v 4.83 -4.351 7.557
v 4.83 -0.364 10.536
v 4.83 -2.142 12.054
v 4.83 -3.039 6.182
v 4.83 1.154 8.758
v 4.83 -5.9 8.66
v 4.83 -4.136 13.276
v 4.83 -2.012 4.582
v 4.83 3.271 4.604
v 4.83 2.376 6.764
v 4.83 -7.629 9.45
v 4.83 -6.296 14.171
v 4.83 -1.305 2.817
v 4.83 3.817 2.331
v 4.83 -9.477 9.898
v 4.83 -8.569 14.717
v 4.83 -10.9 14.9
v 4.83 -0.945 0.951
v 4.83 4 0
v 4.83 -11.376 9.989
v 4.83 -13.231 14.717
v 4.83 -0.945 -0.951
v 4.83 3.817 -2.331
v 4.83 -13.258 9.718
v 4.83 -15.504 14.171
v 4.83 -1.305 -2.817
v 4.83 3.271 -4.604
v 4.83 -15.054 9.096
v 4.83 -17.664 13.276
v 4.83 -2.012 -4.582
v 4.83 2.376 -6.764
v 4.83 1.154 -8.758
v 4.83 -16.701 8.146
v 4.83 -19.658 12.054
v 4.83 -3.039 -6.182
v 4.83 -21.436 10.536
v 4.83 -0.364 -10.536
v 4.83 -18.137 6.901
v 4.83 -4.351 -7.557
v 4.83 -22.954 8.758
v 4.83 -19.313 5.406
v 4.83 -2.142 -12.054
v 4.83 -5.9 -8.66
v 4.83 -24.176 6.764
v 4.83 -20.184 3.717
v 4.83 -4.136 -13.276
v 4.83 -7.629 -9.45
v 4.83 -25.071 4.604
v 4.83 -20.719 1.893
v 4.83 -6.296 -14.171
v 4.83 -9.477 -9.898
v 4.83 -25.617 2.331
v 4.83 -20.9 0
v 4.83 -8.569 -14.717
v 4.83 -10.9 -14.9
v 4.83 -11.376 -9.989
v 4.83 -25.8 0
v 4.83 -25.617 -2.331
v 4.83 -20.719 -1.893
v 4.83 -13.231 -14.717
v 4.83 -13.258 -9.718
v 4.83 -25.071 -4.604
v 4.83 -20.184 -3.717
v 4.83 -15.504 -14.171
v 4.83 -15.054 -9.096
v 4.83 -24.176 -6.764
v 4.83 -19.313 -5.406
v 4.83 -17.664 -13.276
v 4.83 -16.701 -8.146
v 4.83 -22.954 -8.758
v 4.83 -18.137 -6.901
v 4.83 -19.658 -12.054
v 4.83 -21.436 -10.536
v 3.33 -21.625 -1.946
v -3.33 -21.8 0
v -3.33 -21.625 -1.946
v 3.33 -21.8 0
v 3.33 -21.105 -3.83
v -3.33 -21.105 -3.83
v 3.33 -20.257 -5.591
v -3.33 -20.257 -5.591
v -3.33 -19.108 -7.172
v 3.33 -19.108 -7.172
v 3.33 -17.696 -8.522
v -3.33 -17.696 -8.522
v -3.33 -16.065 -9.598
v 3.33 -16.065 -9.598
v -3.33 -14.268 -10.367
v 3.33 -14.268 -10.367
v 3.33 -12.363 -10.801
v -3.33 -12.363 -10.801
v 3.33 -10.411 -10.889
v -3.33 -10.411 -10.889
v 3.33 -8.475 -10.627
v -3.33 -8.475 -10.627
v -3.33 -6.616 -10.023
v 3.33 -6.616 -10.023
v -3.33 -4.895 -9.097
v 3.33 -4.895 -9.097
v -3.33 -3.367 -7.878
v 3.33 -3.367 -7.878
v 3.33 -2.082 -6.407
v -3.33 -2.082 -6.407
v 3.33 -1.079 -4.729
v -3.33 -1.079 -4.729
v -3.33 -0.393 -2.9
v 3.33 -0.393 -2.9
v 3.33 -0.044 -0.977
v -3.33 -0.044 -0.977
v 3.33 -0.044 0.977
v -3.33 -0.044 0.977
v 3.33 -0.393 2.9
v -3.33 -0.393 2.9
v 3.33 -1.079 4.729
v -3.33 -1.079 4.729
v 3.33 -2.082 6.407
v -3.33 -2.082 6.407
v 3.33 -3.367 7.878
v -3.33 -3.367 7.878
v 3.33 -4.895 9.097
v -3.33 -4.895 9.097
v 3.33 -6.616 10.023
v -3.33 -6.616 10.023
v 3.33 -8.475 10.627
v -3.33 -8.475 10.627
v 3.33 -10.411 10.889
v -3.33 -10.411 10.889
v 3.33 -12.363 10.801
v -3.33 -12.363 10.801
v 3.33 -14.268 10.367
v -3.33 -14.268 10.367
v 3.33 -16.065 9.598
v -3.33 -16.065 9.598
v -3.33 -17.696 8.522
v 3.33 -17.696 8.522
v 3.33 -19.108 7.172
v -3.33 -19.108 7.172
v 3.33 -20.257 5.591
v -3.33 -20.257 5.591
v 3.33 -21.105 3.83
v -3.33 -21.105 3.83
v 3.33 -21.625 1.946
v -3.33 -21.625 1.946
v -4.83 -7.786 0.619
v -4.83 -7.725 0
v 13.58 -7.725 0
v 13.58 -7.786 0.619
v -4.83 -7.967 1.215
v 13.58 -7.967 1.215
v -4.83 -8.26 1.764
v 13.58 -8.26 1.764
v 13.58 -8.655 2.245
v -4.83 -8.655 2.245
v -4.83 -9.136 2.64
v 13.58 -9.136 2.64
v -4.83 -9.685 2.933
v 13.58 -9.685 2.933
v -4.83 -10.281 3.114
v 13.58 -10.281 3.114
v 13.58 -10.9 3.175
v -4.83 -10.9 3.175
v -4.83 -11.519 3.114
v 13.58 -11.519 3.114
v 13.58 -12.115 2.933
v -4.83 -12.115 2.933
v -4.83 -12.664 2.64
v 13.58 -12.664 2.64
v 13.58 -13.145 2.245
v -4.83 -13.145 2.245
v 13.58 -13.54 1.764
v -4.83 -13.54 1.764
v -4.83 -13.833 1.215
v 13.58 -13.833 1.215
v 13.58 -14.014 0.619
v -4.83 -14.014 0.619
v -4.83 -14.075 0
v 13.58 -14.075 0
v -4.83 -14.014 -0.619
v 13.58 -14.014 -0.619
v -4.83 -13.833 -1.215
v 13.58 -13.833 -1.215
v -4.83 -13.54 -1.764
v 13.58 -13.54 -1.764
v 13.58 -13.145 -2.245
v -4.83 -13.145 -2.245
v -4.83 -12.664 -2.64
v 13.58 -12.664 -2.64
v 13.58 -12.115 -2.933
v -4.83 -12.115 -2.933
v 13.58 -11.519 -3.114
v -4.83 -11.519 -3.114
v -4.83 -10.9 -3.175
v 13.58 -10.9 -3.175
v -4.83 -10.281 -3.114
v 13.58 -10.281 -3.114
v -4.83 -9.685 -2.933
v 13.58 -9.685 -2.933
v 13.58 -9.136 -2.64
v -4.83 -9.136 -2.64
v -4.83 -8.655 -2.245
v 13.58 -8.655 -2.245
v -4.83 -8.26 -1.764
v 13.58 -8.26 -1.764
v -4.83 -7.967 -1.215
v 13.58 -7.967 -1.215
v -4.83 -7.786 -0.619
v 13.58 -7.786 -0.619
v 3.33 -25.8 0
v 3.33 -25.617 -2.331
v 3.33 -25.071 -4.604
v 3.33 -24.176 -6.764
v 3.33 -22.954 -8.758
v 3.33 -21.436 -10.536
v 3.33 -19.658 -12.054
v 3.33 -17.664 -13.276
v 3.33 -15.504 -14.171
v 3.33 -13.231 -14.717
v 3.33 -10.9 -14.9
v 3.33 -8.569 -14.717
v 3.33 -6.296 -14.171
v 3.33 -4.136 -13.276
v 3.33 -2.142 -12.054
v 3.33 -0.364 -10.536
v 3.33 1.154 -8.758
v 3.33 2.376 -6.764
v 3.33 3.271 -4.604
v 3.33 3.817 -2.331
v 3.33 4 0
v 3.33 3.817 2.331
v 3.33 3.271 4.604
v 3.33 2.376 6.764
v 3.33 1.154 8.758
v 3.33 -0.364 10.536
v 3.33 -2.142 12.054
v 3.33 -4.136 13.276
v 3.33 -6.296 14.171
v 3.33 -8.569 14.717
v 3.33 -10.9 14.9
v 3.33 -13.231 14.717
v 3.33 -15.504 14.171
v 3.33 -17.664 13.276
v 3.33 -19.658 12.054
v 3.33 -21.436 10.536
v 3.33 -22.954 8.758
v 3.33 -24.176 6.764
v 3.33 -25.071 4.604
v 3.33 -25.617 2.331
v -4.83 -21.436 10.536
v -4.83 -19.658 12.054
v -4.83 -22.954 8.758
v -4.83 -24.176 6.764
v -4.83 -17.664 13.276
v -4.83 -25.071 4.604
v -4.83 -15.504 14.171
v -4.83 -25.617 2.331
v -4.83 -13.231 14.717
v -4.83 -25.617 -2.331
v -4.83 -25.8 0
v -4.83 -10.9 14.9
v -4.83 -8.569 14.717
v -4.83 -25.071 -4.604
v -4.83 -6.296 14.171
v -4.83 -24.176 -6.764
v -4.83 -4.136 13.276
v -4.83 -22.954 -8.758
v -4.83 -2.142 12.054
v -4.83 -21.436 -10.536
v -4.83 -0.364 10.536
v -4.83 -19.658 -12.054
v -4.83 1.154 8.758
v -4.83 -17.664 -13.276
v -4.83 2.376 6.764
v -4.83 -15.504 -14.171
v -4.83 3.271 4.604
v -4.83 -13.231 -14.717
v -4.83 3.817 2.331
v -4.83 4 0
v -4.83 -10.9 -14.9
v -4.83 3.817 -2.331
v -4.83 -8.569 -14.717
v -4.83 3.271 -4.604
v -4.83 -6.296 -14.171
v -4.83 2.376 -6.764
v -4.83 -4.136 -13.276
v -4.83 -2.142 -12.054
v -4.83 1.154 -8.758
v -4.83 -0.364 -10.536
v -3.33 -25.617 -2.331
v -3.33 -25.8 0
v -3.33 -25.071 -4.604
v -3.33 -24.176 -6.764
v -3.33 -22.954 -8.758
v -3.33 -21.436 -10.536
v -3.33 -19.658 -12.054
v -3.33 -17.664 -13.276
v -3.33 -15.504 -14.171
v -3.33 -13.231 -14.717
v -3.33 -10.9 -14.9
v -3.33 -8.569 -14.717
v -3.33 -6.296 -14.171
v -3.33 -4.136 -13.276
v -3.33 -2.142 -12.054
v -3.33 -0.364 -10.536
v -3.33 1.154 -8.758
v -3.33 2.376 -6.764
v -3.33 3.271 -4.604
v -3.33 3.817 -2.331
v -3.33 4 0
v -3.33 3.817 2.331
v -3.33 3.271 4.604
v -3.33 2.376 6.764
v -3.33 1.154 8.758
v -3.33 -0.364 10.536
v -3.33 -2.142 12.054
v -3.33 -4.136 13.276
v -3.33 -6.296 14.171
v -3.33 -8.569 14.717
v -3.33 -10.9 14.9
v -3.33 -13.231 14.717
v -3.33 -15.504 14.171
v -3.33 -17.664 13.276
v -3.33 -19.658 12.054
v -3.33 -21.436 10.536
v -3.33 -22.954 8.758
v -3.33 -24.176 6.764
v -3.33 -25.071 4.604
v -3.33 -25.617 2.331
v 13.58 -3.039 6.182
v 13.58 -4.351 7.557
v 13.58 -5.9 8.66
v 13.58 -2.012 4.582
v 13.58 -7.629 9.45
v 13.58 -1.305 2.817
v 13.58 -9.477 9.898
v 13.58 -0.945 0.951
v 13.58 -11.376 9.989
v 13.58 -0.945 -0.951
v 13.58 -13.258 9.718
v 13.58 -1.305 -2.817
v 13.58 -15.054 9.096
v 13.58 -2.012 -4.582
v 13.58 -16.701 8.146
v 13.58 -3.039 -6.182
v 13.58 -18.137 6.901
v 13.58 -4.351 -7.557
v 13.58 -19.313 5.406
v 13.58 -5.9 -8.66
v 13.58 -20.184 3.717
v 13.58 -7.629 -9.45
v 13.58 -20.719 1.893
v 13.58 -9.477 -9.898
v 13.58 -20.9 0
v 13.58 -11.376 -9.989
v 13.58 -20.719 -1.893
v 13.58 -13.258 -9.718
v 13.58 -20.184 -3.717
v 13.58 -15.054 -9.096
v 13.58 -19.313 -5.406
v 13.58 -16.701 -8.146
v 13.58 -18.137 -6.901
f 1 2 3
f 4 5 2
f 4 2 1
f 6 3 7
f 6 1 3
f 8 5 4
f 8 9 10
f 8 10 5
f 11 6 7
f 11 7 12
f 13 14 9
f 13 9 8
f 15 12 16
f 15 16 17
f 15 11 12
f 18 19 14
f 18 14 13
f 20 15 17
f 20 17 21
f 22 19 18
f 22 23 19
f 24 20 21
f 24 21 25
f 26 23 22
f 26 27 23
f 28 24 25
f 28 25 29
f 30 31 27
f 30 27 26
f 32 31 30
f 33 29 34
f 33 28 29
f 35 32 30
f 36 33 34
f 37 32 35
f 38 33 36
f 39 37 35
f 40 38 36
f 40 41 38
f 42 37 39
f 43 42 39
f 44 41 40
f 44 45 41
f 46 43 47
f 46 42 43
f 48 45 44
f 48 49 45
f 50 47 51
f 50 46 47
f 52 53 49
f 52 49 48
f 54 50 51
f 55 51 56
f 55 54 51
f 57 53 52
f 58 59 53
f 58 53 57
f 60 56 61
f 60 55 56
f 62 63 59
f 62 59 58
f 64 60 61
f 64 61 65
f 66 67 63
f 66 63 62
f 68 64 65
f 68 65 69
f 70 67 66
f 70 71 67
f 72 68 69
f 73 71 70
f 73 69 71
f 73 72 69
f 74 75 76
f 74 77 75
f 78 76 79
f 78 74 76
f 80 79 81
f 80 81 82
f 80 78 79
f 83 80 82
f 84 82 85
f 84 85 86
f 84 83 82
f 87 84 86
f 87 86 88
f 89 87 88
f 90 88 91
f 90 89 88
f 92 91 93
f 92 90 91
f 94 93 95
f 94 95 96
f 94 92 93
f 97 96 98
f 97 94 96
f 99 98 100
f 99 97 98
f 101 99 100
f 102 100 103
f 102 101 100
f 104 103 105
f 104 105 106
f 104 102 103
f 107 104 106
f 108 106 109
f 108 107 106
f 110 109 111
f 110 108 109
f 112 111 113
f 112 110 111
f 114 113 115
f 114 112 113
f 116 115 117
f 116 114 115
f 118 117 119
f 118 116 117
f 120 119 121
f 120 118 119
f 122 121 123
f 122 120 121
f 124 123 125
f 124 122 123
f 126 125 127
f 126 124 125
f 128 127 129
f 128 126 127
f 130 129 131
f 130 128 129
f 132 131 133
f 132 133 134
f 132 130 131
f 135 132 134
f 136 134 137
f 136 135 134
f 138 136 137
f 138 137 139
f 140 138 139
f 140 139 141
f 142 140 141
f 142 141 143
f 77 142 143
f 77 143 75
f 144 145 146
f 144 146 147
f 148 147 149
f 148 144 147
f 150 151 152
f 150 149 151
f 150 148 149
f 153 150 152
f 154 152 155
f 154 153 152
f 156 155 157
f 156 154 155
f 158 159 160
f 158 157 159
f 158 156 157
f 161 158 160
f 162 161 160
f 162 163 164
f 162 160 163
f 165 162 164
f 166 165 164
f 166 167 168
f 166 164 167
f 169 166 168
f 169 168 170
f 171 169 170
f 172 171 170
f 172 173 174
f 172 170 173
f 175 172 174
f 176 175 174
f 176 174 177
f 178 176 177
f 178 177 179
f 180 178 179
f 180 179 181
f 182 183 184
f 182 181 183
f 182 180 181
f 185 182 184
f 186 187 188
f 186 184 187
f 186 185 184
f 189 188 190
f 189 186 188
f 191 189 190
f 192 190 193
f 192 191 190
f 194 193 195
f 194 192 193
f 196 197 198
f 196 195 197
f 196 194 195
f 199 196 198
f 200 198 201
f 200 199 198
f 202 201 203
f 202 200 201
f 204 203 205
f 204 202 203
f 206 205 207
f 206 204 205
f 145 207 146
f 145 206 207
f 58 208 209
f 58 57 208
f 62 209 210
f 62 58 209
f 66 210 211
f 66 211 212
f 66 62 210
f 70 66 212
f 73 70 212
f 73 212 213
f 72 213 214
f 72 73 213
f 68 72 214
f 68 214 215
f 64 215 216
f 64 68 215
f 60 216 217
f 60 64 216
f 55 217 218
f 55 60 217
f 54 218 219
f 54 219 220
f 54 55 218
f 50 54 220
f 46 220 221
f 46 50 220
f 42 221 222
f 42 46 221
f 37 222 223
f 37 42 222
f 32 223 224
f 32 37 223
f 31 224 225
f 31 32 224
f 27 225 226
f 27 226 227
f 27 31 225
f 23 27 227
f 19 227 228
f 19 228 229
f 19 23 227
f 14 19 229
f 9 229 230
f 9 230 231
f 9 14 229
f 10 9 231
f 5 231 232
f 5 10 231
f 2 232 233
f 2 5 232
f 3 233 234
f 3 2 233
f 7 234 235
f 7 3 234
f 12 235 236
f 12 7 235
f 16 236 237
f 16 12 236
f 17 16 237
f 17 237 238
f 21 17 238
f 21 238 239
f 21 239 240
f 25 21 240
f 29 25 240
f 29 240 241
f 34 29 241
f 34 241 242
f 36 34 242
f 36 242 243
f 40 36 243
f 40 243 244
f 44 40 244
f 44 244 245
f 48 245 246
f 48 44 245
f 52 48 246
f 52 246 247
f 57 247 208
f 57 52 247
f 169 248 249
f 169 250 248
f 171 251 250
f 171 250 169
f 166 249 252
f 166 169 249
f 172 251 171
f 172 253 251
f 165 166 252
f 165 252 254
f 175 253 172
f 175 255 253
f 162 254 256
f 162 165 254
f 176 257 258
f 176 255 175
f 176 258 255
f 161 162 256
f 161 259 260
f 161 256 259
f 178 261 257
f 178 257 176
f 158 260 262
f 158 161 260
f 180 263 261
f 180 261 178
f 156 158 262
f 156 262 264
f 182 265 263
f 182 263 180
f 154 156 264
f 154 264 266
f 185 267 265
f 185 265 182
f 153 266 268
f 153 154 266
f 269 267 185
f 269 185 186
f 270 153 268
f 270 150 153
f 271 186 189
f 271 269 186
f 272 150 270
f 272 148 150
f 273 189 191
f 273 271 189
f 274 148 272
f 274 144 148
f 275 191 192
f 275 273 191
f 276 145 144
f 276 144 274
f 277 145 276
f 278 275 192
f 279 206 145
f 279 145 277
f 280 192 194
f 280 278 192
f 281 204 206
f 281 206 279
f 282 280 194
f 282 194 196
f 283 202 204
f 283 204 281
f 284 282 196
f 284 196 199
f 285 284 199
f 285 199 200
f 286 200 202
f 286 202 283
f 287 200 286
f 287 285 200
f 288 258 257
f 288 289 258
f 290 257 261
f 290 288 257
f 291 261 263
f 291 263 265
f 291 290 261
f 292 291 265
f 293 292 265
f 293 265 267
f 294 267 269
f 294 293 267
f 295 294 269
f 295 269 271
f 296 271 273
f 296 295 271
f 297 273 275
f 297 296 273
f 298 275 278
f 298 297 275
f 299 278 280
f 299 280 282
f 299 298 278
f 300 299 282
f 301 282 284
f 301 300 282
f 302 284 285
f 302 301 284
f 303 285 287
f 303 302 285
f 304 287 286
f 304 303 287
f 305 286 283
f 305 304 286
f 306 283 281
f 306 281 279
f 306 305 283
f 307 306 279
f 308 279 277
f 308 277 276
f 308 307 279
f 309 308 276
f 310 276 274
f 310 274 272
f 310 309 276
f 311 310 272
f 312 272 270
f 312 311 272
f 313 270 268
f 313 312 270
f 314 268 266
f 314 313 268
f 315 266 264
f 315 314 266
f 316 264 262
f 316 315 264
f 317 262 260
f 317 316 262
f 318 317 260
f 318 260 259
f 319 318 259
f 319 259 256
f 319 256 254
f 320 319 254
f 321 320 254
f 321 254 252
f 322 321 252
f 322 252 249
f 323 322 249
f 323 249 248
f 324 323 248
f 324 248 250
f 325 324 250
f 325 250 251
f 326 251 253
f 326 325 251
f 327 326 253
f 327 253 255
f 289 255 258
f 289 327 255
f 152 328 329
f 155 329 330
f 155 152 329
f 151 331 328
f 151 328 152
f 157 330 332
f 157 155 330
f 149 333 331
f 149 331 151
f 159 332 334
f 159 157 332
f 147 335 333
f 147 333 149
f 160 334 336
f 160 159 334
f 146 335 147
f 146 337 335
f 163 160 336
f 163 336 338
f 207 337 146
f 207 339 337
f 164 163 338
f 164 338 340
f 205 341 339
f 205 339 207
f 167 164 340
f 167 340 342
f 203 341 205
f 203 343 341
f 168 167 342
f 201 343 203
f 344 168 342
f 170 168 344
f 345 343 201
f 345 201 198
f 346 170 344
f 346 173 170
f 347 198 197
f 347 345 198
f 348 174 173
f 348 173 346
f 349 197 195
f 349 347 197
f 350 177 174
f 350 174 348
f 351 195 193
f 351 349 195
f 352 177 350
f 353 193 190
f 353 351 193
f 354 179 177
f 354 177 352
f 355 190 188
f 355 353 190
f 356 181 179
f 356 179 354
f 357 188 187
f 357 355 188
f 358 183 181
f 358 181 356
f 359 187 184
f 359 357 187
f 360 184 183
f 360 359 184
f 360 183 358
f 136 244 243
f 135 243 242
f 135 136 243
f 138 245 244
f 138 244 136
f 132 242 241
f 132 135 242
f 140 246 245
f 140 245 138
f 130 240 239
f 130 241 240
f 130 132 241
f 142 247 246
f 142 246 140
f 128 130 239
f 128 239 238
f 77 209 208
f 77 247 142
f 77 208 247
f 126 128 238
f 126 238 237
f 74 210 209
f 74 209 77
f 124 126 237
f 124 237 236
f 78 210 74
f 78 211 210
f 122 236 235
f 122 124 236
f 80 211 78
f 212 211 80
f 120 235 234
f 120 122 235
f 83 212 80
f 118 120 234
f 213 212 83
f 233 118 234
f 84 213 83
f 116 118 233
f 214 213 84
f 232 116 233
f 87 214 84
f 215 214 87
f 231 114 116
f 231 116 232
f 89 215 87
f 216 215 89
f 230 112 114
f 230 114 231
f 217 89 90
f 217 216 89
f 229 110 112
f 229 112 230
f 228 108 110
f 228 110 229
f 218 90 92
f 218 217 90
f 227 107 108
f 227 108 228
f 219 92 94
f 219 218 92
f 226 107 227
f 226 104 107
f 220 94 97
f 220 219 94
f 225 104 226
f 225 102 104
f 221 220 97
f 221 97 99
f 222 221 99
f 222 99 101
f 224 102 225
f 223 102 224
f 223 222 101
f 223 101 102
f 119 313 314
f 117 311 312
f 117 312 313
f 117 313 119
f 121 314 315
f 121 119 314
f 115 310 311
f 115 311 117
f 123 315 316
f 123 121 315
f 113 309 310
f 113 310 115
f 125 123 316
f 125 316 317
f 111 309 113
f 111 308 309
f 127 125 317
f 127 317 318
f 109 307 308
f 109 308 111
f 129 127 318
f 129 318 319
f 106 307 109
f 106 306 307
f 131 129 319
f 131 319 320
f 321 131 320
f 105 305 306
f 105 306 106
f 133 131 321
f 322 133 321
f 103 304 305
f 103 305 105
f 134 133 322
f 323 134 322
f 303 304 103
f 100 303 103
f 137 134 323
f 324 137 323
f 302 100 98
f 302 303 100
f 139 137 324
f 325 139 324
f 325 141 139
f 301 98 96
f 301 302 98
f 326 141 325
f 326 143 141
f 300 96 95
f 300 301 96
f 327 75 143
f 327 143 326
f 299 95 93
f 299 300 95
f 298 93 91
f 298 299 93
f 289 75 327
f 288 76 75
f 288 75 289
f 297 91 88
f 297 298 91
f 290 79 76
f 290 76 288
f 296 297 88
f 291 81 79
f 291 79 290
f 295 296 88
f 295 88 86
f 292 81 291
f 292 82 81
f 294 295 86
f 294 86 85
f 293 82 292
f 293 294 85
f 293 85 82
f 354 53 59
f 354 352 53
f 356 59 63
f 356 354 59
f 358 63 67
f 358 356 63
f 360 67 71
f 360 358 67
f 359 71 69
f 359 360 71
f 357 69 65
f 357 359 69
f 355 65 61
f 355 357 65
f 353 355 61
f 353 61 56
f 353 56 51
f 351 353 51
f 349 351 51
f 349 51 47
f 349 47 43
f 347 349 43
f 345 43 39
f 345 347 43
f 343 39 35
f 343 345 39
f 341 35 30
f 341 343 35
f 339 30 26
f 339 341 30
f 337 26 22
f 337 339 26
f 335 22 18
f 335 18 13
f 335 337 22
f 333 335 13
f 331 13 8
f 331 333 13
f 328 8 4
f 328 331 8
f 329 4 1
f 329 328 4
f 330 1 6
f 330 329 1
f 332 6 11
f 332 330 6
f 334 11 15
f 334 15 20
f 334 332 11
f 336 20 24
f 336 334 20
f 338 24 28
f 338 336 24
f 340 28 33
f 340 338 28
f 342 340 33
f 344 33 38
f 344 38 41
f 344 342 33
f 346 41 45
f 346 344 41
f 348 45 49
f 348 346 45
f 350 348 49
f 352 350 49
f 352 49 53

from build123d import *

# Parameters (mm, degrees)
CUT_EXTRUDE1_DEPTH      = 36.02253703
CUT_EXTRUDE1_DEPTH_BACK = 36.02253703
SKETCH4_R               = 3.175


with BuildPart() as part:
    # Sketch1 → Revolve1 (revolve)
    with BuildSketch(Plane.XY, mode=Mode.PRIVATE) as revolve1_sk:
        Polygon((-3.33, 0), (3.33, 0), (3.33, 4), (4.83, 4), (4.83, -0.900000061), (13.58, -0.900000061), (13.58, -10.9), (-4.83, -10.9), (-4.83, 4), (-3.33, 4), align=None)
    revolve(revolve1_sk.sketch.rotate(Axis((-4.83, -10.9, 0), (1, 0, 0)), 180), axis=Axis((-4.83, -10.9, 0), (1, 0, 0)))

    # Sketch4 → Cut-Extrude1 (cut, two sides: drawn at the far end of the back side and taken through both)
    with BuildSketch(Plane(origin=(13.58, 0, 0), x_dir=(0, 0, -1), z_dir=(1, 0, 0)).offset(-CUT_EXTRUDE1_DEPTH_BACK)):
        with Locations(Location((0, -10.9, 0), (0, 0, 90))):
            Circle(SKETCH4_R)
    extrude(amount=CUT_EXTRUDE1_DEPTH + CUT_EXTRUDE1_DEPTH_BACK, mode=Mode.SUBTRACT)


solid = part.part
